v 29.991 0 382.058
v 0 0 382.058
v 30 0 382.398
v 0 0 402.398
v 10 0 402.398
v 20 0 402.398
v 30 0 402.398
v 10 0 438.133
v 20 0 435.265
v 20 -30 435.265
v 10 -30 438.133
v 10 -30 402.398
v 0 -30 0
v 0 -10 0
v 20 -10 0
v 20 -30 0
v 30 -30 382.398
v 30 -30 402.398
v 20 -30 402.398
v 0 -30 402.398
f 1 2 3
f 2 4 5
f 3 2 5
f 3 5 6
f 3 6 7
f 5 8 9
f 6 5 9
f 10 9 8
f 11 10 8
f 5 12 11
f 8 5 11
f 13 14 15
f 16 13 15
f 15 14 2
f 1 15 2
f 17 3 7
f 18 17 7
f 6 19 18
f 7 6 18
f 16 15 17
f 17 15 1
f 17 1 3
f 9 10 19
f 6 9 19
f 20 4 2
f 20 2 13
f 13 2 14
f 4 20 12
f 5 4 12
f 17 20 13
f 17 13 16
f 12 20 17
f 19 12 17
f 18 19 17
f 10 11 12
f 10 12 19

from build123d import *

# Parameters (mm, degrees)
F1_DEPTH = 30
F3_DEPTH = 30
F5_DEPTH = 30


with BuildPart() as f1:
    # F0 (on Front) → F1 (new body)
    with BuildSketch(Plane.XZ):
        Polygon((0, 441), (0, 0), (20, 0), (30, 382.397638), (30, 432.397638), align=None)
    extrude(amount=F1_DEPTH)

    # F2 (on face) → F3 (cut)
    with BuildSketch(Plane(origin=(0, 0, 0), x_dir=(0, -1, 0), z_dir=(-1, 0, 0))):
        Polygon((0, 382.058233), (0, 0), (10, 0), align=None)
    extrude(amount=-F3_DEPTH, mode=Mode.SUBTRACT)

    # F4 (on face) → F5 (cut)
    with BuildSketch(Plane.XZ.offset(30)):
        Polygon((30, 402.397638), (30, 432.397638), (20, 435.265092), (20, 402.397638), align=None)
        Polygon((0, 441), (0, 402.397638), (10, 402.397638), (10, 438.132546), align=None)
    extrude(amount=-F5_DEPTH, mode=Mode.SUBTRACT)


solid = f1.part
